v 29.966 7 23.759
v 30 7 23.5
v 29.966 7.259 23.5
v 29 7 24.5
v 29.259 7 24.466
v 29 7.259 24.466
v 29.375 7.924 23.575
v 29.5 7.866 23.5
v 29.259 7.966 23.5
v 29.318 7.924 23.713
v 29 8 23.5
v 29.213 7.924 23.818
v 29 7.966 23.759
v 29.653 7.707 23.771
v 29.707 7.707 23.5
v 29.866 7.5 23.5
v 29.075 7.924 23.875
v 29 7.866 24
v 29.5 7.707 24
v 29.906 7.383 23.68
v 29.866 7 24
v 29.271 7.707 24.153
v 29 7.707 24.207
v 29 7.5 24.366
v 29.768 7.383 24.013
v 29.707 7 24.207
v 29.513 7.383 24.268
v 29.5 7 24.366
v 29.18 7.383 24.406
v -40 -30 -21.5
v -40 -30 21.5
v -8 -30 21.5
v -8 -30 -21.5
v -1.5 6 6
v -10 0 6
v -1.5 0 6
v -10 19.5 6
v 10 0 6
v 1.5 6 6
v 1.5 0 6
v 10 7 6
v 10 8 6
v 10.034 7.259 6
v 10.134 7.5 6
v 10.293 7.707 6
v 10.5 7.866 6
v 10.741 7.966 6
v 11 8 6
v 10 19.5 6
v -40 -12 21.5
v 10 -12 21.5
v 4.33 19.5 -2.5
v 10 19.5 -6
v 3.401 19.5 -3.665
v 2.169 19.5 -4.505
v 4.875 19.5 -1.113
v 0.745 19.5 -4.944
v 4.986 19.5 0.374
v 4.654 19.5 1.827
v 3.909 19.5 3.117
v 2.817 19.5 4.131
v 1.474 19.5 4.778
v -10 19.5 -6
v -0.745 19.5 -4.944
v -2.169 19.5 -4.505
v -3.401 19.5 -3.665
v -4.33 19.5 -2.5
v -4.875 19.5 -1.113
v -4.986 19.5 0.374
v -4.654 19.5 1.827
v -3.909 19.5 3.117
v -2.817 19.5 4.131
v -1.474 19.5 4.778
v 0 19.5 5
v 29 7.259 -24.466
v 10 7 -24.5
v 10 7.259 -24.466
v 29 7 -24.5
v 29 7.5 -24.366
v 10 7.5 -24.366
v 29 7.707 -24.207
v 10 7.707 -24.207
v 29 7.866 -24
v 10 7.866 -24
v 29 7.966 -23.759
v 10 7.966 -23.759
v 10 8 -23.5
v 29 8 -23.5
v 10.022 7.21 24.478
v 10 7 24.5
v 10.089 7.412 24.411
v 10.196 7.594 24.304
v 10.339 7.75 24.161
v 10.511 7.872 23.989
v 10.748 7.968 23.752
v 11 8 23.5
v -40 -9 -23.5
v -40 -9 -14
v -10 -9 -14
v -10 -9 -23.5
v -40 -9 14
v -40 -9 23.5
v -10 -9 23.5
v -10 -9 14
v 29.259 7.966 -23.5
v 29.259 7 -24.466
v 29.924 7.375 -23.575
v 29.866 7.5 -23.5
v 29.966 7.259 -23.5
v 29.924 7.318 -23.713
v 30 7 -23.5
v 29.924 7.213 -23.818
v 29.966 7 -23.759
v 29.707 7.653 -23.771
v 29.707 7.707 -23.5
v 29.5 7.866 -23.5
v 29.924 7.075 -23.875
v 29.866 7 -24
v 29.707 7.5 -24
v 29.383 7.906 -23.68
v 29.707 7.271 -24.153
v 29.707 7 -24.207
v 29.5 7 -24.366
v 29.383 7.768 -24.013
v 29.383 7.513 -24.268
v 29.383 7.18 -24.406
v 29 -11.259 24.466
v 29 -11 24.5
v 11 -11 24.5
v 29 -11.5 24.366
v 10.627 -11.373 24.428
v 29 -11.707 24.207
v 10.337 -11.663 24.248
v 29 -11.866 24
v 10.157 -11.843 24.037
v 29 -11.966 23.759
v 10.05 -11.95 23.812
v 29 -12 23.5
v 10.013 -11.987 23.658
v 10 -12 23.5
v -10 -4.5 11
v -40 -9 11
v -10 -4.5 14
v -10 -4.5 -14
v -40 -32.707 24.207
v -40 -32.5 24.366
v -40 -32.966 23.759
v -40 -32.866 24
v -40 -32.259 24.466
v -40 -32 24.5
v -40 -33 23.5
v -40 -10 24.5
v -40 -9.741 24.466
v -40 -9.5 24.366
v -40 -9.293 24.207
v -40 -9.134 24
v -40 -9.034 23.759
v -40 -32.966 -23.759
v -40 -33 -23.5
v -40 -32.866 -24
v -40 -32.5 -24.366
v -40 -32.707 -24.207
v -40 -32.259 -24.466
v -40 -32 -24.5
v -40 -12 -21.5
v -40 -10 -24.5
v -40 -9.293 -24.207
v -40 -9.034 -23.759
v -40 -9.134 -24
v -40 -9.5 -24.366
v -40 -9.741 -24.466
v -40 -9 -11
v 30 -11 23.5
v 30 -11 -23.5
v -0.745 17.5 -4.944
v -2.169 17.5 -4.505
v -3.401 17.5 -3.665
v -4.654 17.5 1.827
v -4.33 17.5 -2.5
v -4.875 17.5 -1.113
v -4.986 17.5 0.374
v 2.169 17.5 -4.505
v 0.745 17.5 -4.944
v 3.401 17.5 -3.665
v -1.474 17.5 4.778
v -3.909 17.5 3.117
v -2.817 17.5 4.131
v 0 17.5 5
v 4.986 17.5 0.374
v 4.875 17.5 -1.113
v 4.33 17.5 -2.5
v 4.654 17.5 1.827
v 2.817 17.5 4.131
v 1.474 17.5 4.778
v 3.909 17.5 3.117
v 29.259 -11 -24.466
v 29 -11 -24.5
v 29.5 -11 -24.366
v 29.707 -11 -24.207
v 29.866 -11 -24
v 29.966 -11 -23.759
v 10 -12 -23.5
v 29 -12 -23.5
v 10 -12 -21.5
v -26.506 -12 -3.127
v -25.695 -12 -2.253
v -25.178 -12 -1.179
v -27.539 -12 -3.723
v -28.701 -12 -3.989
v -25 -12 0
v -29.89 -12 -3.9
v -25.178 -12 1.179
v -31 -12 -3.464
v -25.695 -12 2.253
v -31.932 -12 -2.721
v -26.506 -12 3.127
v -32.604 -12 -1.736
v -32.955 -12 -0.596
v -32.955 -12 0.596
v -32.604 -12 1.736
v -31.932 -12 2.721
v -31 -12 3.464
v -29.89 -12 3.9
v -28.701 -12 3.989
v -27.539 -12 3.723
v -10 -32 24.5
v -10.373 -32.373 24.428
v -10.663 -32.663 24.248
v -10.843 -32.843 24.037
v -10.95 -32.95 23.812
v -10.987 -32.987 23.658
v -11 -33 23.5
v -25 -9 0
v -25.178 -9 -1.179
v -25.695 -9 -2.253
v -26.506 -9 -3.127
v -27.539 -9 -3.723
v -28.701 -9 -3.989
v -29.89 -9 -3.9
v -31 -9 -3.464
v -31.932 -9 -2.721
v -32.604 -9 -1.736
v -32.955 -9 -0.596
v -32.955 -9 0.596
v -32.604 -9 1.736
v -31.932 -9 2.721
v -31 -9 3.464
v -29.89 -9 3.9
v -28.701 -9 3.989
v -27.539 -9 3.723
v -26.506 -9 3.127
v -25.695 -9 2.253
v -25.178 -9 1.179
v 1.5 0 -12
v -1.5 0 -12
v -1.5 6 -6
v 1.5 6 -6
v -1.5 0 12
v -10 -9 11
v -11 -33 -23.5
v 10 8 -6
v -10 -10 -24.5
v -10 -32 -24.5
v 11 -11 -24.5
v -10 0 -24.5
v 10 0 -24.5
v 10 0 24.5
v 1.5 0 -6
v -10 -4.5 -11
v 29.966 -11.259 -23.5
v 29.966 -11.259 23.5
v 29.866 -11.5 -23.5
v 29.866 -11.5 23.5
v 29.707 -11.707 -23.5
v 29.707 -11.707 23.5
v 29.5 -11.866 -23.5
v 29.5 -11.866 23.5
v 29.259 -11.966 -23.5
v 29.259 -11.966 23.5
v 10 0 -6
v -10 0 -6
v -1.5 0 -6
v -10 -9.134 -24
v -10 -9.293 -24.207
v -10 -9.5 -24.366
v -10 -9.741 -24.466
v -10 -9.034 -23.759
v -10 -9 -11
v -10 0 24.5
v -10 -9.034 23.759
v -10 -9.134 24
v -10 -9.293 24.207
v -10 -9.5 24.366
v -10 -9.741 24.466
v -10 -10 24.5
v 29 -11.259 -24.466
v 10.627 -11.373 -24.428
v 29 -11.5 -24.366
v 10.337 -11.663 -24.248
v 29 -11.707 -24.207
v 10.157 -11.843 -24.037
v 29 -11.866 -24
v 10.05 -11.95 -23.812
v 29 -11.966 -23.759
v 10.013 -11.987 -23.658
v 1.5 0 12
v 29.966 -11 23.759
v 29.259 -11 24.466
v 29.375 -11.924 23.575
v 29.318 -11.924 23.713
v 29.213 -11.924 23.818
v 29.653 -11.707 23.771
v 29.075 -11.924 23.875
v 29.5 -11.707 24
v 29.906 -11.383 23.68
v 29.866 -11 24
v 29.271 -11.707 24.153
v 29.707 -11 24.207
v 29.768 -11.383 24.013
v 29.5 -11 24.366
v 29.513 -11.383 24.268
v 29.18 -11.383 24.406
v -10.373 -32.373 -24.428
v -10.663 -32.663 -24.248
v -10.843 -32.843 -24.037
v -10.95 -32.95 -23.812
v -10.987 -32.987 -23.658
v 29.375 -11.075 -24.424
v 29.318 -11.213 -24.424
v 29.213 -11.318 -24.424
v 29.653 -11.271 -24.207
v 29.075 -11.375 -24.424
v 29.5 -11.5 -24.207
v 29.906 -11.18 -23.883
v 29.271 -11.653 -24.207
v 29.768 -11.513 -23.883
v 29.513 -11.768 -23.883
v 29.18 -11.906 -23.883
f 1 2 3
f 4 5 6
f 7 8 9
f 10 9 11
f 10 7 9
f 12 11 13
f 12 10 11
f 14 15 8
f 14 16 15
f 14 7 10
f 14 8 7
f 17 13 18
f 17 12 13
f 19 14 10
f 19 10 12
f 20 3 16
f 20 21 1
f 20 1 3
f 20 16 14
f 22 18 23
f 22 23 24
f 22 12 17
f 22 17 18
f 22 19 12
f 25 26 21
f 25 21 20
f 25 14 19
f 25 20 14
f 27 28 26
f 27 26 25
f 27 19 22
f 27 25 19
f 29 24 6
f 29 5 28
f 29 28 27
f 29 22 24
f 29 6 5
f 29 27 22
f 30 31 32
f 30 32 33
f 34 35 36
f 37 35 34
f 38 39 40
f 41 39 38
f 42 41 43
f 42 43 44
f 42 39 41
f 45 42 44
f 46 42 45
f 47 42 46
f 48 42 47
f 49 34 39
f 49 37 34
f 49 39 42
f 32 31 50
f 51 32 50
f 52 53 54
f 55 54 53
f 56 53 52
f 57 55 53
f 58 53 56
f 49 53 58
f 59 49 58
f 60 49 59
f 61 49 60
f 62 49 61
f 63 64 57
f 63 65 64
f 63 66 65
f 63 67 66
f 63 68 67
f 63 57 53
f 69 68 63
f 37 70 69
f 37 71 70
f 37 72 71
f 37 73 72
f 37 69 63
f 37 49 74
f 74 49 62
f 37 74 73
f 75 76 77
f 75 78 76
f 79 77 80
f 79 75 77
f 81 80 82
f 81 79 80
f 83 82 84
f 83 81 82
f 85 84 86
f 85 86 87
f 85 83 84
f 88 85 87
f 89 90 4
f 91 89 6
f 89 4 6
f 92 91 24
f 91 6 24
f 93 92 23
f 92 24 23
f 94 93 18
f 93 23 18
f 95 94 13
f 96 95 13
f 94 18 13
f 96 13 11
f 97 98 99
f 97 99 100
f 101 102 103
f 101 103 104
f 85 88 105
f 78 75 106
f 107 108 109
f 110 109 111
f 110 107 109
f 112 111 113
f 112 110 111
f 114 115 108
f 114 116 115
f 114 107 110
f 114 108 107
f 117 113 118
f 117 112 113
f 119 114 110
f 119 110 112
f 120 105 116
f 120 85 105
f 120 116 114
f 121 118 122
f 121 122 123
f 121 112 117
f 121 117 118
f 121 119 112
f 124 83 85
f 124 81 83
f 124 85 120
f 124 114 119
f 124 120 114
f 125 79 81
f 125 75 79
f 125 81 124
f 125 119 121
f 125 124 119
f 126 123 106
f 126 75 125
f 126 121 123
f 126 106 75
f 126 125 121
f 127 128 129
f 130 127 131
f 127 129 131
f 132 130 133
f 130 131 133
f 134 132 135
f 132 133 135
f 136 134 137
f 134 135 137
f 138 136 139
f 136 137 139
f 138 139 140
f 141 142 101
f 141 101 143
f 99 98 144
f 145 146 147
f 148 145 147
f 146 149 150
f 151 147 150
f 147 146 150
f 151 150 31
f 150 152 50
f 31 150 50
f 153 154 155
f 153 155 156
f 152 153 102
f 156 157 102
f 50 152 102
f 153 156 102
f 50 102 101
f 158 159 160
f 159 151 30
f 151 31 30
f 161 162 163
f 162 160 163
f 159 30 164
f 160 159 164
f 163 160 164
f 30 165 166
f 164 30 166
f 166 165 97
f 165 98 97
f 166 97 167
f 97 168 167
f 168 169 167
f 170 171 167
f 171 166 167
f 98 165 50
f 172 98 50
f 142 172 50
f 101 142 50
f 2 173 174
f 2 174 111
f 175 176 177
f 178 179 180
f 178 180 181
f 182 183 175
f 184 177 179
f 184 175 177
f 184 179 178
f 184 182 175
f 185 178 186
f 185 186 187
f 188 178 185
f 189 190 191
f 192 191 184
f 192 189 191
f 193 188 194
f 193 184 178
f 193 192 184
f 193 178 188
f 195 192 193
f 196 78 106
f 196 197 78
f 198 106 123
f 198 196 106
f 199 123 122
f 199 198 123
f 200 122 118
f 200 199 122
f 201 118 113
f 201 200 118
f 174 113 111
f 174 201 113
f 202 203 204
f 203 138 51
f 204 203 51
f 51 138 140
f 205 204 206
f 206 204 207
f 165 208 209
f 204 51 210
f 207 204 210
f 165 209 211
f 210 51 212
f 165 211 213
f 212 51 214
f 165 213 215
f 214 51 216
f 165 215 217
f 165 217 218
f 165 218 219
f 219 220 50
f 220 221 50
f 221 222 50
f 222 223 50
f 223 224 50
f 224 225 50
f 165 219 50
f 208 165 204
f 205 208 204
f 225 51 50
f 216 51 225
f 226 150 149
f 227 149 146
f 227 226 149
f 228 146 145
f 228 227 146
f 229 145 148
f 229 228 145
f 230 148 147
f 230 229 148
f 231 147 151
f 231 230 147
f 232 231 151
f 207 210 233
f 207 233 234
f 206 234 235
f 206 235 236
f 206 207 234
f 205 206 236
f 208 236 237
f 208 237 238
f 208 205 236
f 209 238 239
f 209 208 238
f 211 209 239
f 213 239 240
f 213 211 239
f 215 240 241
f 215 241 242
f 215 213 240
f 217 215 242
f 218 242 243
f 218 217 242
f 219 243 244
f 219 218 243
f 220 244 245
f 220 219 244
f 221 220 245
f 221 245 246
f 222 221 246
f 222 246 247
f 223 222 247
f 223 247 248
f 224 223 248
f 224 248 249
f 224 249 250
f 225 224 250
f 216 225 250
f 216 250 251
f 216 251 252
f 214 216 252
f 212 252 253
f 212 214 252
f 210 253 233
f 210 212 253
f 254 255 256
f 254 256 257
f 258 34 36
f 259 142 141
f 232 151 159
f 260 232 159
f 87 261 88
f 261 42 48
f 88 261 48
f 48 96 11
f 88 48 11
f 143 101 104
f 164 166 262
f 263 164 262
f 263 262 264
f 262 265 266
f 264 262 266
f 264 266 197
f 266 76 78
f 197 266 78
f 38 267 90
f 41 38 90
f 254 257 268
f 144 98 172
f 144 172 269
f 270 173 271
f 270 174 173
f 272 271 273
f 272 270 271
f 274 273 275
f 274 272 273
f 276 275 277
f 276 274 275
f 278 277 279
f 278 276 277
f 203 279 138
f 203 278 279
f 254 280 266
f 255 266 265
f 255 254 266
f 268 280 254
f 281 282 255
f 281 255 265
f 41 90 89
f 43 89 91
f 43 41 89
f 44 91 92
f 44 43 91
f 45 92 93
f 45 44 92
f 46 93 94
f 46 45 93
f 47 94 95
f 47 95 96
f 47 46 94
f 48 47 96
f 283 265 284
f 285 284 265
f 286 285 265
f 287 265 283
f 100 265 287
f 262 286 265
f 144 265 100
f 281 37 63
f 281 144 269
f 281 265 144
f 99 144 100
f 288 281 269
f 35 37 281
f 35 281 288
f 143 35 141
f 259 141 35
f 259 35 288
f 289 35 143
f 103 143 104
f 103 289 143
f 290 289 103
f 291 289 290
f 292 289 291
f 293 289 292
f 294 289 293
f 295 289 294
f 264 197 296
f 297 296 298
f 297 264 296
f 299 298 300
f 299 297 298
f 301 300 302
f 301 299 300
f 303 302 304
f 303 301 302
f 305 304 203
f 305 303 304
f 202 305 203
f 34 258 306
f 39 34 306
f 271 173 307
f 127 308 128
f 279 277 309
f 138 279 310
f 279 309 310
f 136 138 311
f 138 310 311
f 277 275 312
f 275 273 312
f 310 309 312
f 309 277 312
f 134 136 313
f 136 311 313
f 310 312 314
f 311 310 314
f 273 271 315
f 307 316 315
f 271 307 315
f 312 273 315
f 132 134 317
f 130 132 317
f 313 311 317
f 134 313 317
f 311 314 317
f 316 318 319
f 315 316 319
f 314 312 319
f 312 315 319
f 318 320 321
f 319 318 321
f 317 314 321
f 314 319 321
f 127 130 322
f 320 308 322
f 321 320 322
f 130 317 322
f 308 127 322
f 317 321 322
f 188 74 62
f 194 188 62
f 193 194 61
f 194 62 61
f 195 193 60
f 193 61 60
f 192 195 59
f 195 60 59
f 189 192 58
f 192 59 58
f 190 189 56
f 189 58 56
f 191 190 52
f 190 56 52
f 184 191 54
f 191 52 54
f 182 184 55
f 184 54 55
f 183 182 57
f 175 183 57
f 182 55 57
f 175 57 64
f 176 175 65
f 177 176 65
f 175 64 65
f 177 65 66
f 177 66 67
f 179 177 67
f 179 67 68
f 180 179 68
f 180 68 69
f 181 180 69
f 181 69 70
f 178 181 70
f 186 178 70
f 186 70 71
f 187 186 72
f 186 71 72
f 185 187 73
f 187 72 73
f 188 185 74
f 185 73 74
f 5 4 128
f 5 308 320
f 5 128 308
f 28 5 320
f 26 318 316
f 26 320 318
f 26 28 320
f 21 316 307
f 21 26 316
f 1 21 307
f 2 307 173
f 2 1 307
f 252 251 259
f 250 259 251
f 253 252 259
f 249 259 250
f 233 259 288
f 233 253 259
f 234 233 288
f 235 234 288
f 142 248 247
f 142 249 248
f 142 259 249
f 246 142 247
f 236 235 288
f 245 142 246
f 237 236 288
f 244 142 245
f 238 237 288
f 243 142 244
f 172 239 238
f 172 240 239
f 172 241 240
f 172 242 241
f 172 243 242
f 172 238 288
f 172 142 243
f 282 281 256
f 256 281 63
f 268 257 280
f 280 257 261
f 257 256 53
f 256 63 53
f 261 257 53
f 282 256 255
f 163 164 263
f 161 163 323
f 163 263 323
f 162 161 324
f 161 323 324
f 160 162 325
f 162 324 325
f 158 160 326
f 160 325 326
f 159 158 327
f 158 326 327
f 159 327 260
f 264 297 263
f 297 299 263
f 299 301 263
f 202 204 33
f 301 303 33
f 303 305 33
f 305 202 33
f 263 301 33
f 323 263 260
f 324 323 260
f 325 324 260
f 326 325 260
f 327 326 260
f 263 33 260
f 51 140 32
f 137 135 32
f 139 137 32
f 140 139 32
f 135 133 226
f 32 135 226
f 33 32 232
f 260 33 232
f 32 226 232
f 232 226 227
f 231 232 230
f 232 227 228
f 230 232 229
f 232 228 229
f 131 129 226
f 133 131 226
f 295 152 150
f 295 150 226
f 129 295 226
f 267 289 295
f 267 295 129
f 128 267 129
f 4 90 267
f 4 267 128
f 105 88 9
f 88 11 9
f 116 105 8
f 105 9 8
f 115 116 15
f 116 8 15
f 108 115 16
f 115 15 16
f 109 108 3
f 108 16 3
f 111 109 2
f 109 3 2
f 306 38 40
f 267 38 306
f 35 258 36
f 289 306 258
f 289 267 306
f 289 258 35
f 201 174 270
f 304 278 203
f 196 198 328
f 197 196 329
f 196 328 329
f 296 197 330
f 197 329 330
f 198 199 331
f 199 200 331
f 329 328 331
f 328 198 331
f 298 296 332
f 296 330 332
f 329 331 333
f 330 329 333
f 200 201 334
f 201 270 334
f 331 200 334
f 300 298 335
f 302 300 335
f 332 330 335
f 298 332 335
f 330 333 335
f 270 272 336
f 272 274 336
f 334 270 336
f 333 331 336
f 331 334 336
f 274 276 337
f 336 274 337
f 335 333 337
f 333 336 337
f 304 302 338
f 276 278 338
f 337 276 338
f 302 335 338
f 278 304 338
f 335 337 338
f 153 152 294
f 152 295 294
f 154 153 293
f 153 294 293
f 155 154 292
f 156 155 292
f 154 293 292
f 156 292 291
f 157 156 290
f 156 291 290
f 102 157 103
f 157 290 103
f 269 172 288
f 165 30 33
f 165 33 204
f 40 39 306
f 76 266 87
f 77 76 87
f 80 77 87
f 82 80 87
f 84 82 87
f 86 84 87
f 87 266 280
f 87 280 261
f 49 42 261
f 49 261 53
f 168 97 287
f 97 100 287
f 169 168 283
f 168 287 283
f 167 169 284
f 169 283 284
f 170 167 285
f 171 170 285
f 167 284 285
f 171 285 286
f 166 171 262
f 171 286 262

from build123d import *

# Parameters (mm, degrees)
EXTRUDE_1_DEPTH         = 30
EXTRUDE_1_DEPTH_BACK    = 40
SKETCH_2_W              = 49
SKETCH_2_H              = 24
SKETCH_2_W_2            = 43
SKETCH_2_H_2            = 18
EXTRUDE_1_2_DEPTH       = 6
SKETCH_1_3_W            = 20
SKETCH_1_3_H            = 8
EXTRUDE_2_DEPTH         = 24.5
CUT_EXTRUDE_1_DEPTH     = 25
RIB_1_REACH             = 58.032
SKETCH_4_WALLS_W        = 145.49538697
SKETCH_4_WALLS_H        = 3
RIB_2_REACH             = 65.649
SKETCH_6_WALLS_W        = 3
SKETCH_6_WALLS_H        = 137.784142328
CUT_EXTRUDE_START       = -12
CUT_EXTRUDE_2_OUTLINE_R = 4
CUT_EXTRUDE_2_DEPTH     = 3
FILLET_1_R              = 1
SKETCH_7_R              = 5
CUT_EXTRUDE_4_DEPTH     = 2


# Read off the part's stored shape, not the designer's step: 컷-돌출2
with BuildPart() as part:
    # 스케치2 → Extrude 1 (new, two sides: drawn at the far end of the back side and taken through both)
    with BuildSketch(Plane(origin=(0, 0, 0), x_dir=(0, 0, -1), z_dir=(1, 0, 0)).offset(-EXTRUDE_1_DEPTH_BACK)):
        with Locations((0, -21)):
            Rectangle(SKETCH_2_W, SKETCH_2_H)
        with Locations((0, -21)):
            Rectangle(SKETCH_2_W_2, SKETCH_2_H_2, mode=Mode.SUBTRACT)
    extrude(amount=EXTRUDE_1_DEPTH + EXTRUDE_1_DEPTH_BACK)



with BuildPart() as body_2:
    # 스케치1 → Extrude 1 2 (new, symmetric)
    with BuildSketch(Plane.XY):
        Polygon((-10, 19.5), (-10, 0), (10, 0), (10, 8), (10, 19.5), align=None)
    extrude(amount=EXTRUDE_1_2_DEPTH, both=True)


with BuildPart() as part_1:
    add(part.part)

    add(body_2.part)  # 보스-돌출2 merges body 2
    # 스케치1<3> → 보스-돌출2 (add, symmetric)
    with BuildSketch(Plane.XY):
        Polygon((10, 0), (-10, 0), (-10, -12), (10, -12), (30, -12), (30, 0), align=None)
        with Locations((20, 4)):
            Rectangle(SKETCH_1_3_W, SKETCH_1_3_H)
    extrude(amount=EXTRUDE_2_DEPTH, both=True)

    # 스케치1<4> → 컷-돌출1 (cut, symmetric)
    with BuildSketch(Plane.XY):
        Polygon((30, -12), (10, -12), (-11, -33), (30, -33), align=None)
    extrude(amount=CUT_EXTRUDE_1_DEPTH, both=True, mode=Mode.SUBTRACT)

    # 스케치4 walls → 보강대1 (add, up to next)
    with BuildSketch(Plane(origin=(0.4400978, -2.93398533, 0), x_dir=(0.9889363528682976, 0.14834045293024445, 0), z_dir=(-0.14834045293024445, 0.9889363528682976, 0)), mode=Mode.PRIVATE) as rib_1_sk1:
        with Locations((-25.177107795, -12.5)):
            Rectangle(SKETCH_4_WALLS_W, SKETCH_4_WALLS_H)
    rib_1_tool1 = extrude(rib_1_sk1.sketch, amount=-RIB_1_REACH, mode=Mode.PRIVATE) - part_1.part
    # 스케치4 walls → 보강대1 (add, up to next)
    with BuildSketch(Plane(origin=(0.4400978, -2.93398533, 0), x_dir=(0.9889363528682976, 0.14834045293024445, 0), z_dir=(-0.14834045293024445, 0.9889363528682976, 0)), mode=Mode.PRIVATE) as rib_1_sk2:
        with Locations((-25.177107795, 12.5)):
            Rectangle(SKETCH_4_WALLS_W, SKETCH_4_WALLS_H)
    rib_1_tool2 = extrude(rib_1_sk2.sketch, amount=-RIB_1_REACH, mode=Mode.PRIVATE) - part_1.part
    add(rib_1_tool1.solids().sort_by_distance((-24.458459359, -6.668768904, 12.5))[0])
    add(rib_1_tool2.solids().sort_by_distance((-24.458459359, -6.668768904, -12.5))[0])

    # 스케치6 walls → 보강대2 (add, up to next)
    with BuildSketch(Plane(origin=(0, 6, -6), x_dir=(1, 0, 0), z_dir=(0, 0.7071067811865477, -0.7071067811865474)), mode=Mode.PRIVATE) as rib_2_sk1:
        with Locations((0, 4.242640687)):
            Rectangle(SKETCH_6_WALLS_W, SKETCH_6_WALLS_H)
    rib_2_tool1 = extrude(rib_2_sk1.sketch, amount=-RIB_2_REACH, mode=Mode.PRIVATE) - part_1.part
    rib_2 = rib_2_tool1.solids().sort_by_distance((0, 3, -9))[0]
    add(rib_2)

    # 대칭 복사1: 보강대2 across plane
    add(rib_2.mirror(Plane.XY))

    # 컷-돌출2 outline → 컷-돌출2 (cut)
    with BuildSketch(Plane(origin=(0, 0, 0), x_dir=(1, 0, 0), z_dir=(0, 1, 0)).offset(CUT_EXTRUDE_START)):
        with Locations((-29, 0)):
            Circle(CUT_EXTRUDE_2_OUTLINE_R)
    extrude(amount=CUT_EXTRUDE_2_DEPTH, mode=Mode.SUBTRACT)

    # 필렛1
    fillet_1_edges = [part_1.edges().sort_by_distance(p)[0] for p in [
        (30, -2, 24.5),
        (30, -12, 0),
        (20, 8, -24.5),
        (30, 8, 0),
        (10, 8, 15.25),
        (20, 8, 24.5),
        (-25.5, -33, 24.5),
        (-25, -9, 24.5),
        (-25, -9, -24.5),
        (-25.5, -33, -24.5),
        (30, -2, -24.5),
        (20, -12, 24.5),
        (20, -12, -24.5),
    ]]
    fillet(fillet_1_edges, radius=FILLET_1_R)

    # 스케치7 → 컷-돌출4 (cut)
    with BuildSketch(Plane(origin=(0, 19.5, 0), x_dir=(1, 0, 0), z_dir=(0, 1, 0))):
        with Locations(Location((0, 0, 0), (0, 0, 270))):
            Circle(SKETCH_7_R)
    extrude(amount=-CUT_EXTRUDE_4_DEPTH, mode=Mode.SUBTRACT)


solid = part_1.part
